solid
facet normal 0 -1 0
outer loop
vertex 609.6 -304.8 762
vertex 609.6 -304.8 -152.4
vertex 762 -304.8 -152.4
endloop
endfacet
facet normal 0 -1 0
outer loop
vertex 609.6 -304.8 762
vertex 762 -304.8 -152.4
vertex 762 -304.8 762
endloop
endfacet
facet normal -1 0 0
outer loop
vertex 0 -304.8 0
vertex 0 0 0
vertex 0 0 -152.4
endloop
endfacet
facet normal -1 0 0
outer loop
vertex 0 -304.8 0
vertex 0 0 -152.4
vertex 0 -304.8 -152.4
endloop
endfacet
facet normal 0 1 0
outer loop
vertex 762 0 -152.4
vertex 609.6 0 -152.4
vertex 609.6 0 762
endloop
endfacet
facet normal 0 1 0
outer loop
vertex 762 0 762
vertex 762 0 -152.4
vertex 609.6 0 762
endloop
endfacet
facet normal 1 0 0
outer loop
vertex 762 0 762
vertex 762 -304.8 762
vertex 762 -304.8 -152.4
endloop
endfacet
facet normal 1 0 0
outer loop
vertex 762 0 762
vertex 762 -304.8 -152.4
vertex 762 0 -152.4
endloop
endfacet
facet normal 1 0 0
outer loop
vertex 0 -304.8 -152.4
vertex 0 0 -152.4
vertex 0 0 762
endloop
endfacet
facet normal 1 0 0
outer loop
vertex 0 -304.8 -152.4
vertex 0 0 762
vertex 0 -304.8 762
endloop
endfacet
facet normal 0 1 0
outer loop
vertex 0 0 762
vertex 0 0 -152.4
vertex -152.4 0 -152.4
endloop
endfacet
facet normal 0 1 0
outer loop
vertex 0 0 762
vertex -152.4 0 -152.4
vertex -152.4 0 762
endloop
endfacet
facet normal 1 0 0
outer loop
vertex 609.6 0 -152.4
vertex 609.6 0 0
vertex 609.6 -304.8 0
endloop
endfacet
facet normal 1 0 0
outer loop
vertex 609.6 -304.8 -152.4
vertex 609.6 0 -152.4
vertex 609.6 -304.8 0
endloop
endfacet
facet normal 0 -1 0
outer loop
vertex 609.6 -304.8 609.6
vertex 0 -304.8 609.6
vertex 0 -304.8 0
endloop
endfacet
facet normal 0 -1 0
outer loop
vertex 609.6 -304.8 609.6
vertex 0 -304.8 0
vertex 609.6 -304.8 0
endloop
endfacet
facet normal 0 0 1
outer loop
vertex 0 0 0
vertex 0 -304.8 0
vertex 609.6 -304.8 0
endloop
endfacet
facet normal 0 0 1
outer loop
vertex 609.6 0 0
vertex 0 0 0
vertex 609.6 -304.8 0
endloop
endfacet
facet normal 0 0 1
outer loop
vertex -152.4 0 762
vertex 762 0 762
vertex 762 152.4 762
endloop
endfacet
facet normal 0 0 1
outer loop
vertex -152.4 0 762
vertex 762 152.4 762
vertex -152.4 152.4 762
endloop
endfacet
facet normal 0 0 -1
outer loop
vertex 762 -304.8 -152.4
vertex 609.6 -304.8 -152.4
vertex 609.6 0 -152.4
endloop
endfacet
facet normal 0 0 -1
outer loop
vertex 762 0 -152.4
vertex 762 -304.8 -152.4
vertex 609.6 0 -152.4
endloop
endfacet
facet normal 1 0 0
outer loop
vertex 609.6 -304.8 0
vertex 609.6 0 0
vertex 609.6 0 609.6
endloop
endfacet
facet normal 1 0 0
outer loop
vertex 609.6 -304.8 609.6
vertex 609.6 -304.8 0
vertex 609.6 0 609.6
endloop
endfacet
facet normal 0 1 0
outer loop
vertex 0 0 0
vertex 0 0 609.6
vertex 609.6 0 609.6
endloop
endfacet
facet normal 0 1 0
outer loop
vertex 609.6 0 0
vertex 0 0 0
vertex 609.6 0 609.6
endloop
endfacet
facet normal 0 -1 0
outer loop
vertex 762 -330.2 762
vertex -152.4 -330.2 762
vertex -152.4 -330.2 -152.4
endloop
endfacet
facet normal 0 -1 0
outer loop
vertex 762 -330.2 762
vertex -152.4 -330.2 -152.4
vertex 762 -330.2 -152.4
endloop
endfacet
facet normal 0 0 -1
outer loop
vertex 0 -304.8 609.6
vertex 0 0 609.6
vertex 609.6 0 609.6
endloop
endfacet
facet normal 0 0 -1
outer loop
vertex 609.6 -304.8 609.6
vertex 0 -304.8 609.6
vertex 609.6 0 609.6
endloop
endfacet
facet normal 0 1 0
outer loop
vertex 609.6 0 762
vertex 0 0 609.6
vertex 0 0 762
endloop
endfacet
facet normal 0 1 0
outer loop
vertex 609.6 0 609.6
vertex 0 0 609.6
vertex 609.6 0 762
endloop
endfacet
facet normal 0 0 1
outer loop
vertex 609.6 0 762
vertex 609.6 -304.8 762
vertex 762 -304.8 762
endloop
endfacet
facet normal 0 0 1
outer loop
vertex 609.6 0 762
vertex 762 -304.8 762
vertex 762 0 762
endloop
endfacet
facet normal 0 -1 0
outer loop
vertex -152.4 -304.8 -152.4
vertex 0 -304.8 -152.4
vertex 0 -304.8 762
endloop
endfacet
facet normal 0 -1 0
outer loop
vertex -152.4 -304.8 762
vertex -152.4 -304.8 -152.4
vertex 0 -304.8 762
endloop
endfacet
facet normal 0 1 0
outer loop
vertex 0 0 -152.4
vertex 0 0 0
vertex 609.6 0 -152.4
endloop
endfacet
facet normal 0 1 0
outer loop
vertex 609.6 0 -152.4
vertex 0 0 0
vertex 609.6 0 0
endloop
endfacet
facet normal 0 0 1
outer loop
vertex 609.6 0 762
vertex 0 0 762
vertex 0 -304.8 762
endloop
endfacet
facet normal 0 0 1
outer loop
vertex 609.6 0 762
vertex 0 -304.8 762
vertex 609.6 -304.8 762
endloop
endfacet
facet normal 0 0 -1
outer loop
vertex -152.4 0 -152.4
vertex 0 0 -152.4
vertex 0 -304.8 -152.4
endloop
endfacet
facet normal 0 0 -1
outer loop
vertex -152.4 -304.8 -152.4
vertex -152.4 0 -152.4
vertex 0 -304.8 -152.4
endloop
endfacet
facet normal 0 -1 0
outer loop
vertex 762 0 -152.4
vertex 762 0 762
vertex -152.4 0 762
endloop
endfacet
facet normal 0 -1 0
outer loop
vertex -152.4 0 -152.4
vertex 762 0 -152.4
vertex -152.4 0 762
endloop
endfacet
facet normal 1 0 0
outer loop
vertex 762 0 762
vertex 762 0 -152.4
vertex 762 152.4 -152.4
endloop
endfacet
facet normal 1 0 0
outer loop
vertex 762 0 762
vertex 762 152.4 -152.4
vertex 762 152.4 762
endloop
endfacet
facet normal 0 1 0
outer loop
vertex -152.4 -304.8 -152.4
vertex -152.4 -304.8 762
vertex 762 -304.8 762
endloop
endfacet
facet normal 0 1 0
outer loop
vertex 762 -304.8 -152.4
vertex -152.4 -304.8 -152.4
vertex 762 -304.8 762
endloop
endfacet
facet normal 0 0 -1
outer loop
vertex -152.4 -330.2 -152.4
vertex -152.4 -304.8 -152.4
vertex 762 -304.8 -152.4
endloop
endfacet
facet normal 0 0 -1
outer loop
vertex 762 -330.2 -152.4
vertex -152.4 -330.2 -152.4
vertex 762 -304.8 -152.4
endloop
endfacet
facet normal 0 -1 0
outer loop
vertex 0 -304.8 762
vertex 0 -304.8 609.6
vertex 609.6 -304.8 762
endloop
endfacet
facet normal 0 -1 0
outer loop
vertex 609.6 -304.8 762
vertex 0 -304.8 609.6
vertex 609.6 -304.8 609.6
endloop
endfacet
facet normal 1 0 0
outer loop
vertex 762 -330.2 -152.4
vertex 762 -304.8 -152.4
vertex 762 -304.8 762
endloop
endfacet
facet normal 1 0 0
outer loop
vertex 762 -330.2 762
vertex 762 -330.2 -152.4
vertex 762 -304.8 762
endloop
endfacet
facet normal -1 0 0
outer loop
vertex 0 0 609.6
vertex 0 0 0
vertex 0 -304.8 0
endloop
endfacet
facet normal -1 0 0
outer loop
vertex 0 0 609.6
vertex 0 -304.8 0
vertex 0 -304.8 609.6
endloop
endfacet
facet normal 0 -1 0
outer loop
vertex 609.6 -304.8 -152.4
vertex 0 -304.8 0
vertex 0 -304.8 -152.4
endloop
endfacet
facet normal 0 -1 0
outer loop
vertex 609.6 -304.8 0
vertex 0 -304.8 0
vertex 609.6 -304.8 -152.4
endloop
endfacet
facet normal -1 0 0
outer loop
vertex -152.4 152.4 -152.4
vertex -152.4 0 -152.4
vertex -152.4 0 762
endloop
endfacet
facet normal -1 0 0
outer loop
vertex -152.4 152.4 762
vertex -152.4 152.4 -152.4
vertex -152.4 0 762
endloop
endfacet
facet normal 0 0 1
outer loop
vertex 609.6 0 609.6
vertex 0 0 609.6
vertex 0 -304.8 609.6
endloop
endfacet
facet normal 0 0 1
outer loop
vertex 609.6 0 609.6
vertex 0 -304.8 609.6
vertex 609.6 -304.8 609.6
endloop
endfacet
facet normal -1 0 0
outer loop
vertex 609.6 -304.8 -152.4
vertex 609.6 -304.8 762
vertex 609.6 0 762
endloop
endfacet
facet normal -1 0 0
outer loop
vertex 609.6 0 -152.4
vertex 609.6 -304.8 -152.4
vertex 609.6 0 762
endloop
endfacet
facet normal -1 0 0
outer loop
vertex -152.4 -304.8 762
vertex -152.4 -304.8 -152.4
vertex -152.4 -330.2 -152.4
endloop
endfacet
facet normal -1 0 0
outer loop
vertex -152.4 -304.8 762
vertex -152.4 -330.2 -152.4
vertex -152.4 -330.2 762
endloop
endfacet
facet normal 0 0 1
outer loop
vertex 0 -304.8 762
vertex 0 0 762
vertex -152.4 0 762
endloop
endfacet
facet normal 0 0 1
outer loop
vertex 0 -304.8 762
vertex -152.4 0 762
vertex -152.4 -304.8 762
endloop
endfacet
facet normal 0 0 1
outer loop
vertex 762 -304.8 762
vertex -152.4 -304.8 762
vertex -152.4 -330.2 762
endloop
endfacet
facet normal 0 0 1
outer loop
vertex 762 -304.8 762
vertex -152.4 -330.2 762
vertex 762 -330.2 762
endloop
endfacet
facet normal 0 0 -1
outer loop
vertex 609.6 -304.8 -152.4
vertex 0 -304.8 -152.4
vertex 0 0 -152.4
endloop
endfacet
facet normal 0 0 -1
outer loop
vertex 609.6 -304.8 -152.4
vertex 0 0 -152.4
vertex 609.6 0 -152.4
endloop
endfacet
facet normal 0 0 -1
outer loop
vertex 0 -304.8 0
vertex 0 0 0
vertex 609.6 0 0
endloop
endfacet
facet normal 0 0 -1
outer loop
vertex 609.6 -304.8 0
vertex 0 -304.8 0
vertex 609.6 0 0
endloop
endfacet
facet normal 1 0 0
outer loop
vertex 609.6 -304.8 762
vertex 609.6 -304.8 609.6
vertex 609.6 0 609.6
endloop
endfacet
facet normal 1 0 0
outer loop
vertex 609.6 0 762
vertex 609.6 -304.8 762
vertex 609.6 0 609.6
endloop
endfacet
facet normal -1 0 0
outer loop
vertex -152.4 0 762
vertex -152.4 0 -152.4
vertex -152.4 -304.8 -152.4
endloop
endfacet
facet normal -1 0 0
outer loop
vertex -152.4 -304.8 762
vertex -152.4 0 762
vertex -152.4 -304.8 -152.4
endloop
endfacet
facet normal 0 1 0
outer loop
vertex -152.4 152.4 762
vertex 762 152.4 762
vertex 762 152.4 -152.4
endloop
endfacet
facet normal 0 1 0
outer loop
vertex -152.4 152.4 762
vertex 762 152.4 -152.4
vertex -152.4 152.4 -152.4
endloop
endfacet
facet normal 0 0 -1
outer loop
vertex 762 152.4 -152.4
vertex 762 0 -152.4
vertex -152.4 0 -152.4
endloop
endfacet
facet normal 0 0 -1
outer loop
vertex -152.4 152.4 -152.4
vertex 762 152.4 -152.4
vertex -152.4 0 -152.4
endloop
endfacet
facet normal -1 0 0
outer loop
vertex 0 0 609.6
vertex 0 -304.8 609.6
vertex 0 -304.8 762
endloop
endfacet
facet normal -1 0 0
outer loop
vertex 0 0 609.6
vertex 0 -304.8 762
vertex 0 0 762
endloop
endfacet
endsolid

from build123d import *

# Parameters (mm, degrees)
F0_W      = 609.6
F0_H      = 609.6
F1_DEPTH  = 304.8
F2_W      = 609.6
F2_H      = 304.8
F3_DEPTH  = 152.4
F4_W      = 609.6
F4_H      = 304.8
F5_DEPTH  = 152.4
F6_W      = 304.8
F6_H      = 914.4
F7_DEPTH  = 152.4
F8_W      = 304.8
F8_H      = 914.4
F9_DEPTH  = 152.4
F10_W     = 914.4
F10_H     = 914.4
F11_DEPTH = 152.4
F12_W     = 914.4
F12_H     = 914.4
F13_DEPTH = 25.4


with BuildPart() as f1:
    # F0 (on Front) → F1 (new body)
    with BuildSketch(Plane.XZ):
        with Locations((304.8, 304.8)):
            Rectangle(F0_W, F0_H)
    extrude(amount=F1_DEPTH)


with BuildPart() as f3:
    # F2 (on face) → F3 (new body)
    with BuildSketch(Plane.XY.offset(609.6)):
        with Locations((304.8, -152.4)):
            Rectangle(F2_W, F2_H)
    extrude(amount=F3_DEPTH)


with BuildPart() as f5:
    # F4 (on face) → F5 (new body)
    with BuildSketch(Plane(origin=(0, 0, 0), x_dir=(1, 0, 0), z_dir=(0, 0, -1))):
        with Locations((304.8, 152.4)):
            Rectangle(F4_W, F4_H)
    extrude(amount=F5_DEPTH)


with BuildPart() as f7:
    # F6 (on face) → F7 (new body)
    with BuildSketch(Plane(origin=(0, 0, 0), x_dir=(0, -1, 0), z_dir=(-1, 0, 0))):
        with Locations((152.4, 304.8)):
            Rectangle(F6_W, F6_H)
    extrude(amount=F7_DEPTH)


with BuildPart() as f9:
    # F8 (on face) → F9 (new body)
    with BuildSketch(Plane.YZ.offset(609.6)):
        with Locations((-152.4, 304.8)):
            Rectangle(F8_W, F8_H)
    extrude(amount=F9_DEPTH)


with BuildPart() as f11:
    # F10 (on face) → F11 (new body)
    with BuildSketch(Plane(origin=(0, 0, 0), x_dir=(-1, 0, 0), z_dir=(0, 1, 0))):
        with Locations((-304.8, 304.8)):
            Rectangle(F10_W, F10_H)
    extrude(amount=F11_DEPTH)


with BuildPart() as f13:
    # F12 (on face) → F13 (new body)
    with BuildSketch(Plane.XZ.offset(304.8)):
        with Locations((304.8, 304.8)):
            Rectangle(F12_W, F12_H)
    extrude(amount=F13_DEPTH)


solid = Compound([f1.part, f3.part, f5.part, f7.part, f9.part, f11.part, f13.part])
